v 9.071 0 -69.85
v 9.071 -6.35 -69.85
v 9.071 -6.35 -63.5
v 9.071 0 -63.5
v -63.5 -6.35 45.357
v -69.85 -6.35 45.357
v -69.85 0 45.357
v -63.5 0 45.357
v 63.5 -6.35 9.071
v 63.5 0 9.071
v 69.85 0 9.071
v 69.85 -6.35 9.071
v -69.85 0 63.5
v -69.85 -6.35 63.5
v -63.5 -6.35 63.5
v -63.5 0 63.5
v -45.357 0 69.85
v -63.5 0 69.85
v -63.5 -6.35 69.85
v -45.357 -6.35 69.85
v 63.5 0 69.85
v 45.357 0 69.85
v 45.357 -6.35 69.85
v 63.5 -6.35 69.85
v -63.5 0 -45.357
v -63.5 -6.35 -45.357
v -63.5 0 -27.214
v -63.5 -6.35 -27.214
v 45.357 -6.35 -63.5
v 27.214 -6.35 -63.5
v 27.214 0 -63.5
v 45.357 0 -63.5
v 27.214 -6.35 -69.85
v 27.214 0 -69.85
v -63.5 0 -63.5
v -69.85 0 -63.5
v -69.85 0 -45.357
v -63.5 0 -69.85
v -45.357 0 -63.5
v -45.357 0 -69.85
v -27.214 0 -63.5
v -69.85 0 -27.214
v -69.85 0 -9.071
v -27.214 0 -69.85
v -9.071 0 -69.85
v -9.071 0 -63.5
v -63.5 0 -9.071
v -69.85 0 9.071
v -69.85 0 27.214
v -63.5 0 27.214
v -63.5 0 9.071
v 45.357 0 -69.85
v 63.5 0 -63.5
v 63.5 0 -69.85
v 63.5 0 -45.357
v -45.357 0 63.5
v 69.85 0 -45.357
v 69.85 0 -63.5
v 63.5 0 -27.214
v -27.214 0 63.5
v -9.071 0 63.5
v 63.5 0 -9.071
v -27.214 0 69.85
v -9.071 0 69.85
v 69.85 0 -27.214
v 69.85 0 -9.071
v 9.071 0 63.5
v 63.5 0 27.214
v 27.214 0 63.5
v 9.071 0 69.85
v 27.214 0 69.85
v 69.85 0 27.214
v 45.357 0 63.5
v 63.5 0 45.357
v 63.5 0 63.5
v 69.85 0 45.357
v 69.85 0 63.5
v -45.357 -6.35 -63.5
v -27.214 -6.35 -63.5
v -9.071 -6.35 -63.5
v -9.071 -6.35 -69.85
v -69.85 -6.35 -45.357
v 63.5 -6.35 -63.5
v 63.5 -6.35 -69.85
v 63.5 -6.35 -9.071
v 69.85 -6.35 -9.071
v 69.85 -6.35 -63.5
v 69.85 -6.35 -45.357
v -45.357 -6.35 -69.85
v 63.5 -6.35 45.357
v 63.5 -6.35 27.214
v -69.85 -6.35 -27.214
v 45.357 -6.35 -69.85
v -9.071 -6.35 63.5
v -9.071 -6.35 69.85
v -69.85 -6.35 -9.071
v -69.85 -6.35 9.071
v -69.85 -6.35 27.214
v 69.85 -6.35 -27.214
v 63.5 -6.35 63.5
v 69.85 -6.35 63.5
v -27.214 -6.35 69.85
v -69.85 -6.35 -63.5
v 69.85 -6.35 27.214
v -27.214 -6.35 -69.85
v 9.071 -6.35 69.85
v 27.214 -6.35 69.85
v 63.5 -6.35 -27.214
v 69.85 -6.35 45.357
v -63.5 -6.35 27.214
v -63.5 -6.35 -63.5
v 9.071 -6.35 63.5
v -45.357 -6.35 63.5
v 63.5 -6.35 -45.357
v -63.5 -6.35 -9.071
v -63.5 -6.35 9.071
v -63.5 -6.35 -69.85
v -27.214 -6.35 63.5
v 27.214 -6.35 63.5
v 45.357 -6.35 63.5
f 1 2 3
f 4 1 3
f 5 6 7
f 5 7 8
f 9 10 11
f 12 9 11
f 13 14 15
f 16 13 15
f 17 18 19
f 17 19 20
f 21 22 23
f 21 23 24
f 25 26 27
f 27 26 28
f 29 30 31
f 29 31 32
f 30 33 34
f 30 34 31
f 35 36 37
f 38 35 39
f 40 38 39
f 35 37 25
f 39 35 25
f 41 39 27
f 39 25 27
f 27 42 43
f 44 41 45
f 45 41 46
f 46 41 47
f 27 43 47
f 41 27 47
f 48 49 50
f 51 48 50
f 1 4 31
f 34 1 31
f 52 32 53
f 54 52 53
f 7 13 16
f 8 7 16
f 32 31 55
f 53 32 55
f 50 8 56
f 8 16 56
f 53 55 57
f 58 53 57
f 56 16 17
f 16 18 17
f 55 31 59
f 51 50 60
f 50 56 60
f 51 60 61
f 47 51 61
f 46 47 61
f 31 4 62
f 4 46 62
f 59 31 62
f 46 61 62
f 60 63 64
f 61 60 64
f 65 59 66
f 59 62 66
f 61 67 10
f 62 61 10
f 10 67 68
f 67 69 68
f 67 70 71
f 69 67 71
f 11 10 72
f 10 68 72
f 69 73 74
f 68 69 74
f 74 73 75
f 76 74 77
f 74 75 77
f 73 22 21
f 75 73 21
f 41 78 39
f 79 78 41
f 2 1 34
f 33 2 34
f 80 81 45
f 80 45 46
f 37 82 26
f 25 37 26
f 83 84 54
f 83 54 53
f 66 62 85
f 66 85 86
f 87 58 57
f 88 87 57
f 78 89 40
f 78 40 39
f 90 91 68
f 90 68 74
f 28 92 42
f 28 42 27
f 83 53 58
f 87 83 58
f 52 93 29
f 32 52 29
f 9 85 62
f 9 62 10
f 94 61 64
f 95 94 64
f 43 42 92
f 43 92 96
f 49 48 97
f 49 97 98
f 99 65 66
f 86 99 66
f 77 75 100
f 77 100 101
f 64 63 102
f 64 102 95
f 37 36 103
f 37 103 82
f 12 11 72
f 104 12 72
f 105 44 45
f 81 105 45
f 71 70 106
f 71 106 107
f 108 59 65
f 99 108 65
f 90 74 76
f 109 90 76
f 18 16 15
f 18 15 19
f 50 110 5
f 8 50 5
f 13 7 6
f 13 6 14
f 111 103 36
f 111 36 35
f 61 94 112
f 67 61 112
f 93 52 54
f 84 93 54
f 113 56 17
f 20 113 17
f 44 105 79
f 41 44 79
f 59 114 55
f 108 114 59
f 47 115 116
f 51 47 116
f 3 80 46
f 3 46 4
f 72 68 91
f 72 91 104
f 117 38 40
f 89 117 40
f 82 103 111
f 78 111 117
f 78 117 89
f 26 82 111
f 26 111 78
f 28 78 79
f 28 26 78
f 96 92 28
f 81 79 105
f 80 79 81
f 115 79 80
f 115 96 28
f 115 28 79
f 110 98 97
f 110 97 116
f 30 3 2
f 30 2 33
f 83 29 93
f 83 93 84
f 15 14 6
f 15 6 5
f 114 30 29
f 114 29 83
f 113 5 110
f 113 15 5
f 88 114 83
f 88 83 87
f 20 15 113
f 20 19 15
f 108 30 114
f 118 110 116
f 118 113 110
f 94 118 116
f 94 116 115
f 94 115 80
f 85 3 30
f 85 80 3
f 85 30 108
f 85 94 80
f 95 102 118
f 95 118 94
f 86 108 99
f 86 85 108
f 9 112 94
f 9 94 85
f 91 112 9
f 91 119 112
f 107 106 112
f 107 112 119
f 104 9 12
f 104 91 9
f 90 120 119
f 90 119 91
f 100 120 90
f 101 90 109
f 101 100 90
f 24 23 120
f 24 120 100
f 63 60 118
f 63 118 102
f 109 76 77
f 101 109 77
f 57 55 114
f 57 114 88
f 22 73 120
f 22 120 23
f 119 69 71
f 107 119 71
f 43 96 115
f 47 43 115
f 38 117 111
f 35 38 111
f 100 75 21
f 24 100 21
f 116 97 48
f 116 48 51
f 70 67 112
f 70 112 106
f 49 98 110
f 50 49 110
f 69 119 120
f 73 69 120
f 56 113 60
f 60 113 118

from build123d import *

# Parameters (mm, degrees)
F0_W     = 139.7
F0_H     = 139.7
F1_DEPTH = 6.35
F2_W     = 6.35
F2_H     = 6.35
F2_W_2   = 18.1428571429
F2_H_2   = 18.1428571429
F3_DEPTH = 25.4


with BuildPart() as f1:
    # F0 (on Front) → F1 (new body)
    with BuildSketch(Plane.XZ):
        Rectangle(F0_W, F0_H)
    extrude(amount=F1_DEPTH)

    # F2 (on face) → F3 (cut)
    with BuildSketch(Plane.XZ.offset(6.35)):
        with Locations((-66.675, 66.675)):
            Rectangle(F2_W, F2_H)
        with Locations((-36.2857142857, 66.675)):
            Rectangle(F2_W_2, F2_H)
        with Locations((0, 66.675)):
            Rectangle(F2_W_2, F2_H)
        with Locations((36.2857142857, 66.675)):
            Rectangle(F2_W_2, F2_H)
        with Locations((66.675, 66.675)):
            Rectangle(F2_W, F2_H)
        with Locations((66.675, 36.2857142857)):
            Rectangle(F2_W, F2_H_2)
        with Locations((66.675, 0)):
            Rectangle(F2_W, F2_H_2)
        with Locations((66.675, -36.2857142857)):
            Rectangle(F2_W, F2_H_2)
        with Locations((66.675, -66.675)):
            Rectangle(F2_W, F2_H)
        with Locations((36.2857142857, -66.675)):
            Rectangle(F2_W_2, F2_H)
        with Locations((0, -66.675)):
            Rectangle(F2_W_2, F2_H)
        with Locations((-36.2857142857, -66.675)):
            Rectangle(F2_W_2, F2_H)
        with Locations((-66.675, -66.675)):
            Rectangle(F2_W, F2_H)
        with Locations((-66.675, -36.2857142857)):
            Rectangle(F2_W, F2_H_2)
        with Locations((-66.675, 0)):
            Rectangle(F2_W, F2_H_2)
        with Locations((-66.675, 36.2857142857)):
            Rectangle(F2_W, F2_H_2)
    extrude(amount=-F3_DEPTH, mode=Mode.SUBTRACT)


solid = f1.part
